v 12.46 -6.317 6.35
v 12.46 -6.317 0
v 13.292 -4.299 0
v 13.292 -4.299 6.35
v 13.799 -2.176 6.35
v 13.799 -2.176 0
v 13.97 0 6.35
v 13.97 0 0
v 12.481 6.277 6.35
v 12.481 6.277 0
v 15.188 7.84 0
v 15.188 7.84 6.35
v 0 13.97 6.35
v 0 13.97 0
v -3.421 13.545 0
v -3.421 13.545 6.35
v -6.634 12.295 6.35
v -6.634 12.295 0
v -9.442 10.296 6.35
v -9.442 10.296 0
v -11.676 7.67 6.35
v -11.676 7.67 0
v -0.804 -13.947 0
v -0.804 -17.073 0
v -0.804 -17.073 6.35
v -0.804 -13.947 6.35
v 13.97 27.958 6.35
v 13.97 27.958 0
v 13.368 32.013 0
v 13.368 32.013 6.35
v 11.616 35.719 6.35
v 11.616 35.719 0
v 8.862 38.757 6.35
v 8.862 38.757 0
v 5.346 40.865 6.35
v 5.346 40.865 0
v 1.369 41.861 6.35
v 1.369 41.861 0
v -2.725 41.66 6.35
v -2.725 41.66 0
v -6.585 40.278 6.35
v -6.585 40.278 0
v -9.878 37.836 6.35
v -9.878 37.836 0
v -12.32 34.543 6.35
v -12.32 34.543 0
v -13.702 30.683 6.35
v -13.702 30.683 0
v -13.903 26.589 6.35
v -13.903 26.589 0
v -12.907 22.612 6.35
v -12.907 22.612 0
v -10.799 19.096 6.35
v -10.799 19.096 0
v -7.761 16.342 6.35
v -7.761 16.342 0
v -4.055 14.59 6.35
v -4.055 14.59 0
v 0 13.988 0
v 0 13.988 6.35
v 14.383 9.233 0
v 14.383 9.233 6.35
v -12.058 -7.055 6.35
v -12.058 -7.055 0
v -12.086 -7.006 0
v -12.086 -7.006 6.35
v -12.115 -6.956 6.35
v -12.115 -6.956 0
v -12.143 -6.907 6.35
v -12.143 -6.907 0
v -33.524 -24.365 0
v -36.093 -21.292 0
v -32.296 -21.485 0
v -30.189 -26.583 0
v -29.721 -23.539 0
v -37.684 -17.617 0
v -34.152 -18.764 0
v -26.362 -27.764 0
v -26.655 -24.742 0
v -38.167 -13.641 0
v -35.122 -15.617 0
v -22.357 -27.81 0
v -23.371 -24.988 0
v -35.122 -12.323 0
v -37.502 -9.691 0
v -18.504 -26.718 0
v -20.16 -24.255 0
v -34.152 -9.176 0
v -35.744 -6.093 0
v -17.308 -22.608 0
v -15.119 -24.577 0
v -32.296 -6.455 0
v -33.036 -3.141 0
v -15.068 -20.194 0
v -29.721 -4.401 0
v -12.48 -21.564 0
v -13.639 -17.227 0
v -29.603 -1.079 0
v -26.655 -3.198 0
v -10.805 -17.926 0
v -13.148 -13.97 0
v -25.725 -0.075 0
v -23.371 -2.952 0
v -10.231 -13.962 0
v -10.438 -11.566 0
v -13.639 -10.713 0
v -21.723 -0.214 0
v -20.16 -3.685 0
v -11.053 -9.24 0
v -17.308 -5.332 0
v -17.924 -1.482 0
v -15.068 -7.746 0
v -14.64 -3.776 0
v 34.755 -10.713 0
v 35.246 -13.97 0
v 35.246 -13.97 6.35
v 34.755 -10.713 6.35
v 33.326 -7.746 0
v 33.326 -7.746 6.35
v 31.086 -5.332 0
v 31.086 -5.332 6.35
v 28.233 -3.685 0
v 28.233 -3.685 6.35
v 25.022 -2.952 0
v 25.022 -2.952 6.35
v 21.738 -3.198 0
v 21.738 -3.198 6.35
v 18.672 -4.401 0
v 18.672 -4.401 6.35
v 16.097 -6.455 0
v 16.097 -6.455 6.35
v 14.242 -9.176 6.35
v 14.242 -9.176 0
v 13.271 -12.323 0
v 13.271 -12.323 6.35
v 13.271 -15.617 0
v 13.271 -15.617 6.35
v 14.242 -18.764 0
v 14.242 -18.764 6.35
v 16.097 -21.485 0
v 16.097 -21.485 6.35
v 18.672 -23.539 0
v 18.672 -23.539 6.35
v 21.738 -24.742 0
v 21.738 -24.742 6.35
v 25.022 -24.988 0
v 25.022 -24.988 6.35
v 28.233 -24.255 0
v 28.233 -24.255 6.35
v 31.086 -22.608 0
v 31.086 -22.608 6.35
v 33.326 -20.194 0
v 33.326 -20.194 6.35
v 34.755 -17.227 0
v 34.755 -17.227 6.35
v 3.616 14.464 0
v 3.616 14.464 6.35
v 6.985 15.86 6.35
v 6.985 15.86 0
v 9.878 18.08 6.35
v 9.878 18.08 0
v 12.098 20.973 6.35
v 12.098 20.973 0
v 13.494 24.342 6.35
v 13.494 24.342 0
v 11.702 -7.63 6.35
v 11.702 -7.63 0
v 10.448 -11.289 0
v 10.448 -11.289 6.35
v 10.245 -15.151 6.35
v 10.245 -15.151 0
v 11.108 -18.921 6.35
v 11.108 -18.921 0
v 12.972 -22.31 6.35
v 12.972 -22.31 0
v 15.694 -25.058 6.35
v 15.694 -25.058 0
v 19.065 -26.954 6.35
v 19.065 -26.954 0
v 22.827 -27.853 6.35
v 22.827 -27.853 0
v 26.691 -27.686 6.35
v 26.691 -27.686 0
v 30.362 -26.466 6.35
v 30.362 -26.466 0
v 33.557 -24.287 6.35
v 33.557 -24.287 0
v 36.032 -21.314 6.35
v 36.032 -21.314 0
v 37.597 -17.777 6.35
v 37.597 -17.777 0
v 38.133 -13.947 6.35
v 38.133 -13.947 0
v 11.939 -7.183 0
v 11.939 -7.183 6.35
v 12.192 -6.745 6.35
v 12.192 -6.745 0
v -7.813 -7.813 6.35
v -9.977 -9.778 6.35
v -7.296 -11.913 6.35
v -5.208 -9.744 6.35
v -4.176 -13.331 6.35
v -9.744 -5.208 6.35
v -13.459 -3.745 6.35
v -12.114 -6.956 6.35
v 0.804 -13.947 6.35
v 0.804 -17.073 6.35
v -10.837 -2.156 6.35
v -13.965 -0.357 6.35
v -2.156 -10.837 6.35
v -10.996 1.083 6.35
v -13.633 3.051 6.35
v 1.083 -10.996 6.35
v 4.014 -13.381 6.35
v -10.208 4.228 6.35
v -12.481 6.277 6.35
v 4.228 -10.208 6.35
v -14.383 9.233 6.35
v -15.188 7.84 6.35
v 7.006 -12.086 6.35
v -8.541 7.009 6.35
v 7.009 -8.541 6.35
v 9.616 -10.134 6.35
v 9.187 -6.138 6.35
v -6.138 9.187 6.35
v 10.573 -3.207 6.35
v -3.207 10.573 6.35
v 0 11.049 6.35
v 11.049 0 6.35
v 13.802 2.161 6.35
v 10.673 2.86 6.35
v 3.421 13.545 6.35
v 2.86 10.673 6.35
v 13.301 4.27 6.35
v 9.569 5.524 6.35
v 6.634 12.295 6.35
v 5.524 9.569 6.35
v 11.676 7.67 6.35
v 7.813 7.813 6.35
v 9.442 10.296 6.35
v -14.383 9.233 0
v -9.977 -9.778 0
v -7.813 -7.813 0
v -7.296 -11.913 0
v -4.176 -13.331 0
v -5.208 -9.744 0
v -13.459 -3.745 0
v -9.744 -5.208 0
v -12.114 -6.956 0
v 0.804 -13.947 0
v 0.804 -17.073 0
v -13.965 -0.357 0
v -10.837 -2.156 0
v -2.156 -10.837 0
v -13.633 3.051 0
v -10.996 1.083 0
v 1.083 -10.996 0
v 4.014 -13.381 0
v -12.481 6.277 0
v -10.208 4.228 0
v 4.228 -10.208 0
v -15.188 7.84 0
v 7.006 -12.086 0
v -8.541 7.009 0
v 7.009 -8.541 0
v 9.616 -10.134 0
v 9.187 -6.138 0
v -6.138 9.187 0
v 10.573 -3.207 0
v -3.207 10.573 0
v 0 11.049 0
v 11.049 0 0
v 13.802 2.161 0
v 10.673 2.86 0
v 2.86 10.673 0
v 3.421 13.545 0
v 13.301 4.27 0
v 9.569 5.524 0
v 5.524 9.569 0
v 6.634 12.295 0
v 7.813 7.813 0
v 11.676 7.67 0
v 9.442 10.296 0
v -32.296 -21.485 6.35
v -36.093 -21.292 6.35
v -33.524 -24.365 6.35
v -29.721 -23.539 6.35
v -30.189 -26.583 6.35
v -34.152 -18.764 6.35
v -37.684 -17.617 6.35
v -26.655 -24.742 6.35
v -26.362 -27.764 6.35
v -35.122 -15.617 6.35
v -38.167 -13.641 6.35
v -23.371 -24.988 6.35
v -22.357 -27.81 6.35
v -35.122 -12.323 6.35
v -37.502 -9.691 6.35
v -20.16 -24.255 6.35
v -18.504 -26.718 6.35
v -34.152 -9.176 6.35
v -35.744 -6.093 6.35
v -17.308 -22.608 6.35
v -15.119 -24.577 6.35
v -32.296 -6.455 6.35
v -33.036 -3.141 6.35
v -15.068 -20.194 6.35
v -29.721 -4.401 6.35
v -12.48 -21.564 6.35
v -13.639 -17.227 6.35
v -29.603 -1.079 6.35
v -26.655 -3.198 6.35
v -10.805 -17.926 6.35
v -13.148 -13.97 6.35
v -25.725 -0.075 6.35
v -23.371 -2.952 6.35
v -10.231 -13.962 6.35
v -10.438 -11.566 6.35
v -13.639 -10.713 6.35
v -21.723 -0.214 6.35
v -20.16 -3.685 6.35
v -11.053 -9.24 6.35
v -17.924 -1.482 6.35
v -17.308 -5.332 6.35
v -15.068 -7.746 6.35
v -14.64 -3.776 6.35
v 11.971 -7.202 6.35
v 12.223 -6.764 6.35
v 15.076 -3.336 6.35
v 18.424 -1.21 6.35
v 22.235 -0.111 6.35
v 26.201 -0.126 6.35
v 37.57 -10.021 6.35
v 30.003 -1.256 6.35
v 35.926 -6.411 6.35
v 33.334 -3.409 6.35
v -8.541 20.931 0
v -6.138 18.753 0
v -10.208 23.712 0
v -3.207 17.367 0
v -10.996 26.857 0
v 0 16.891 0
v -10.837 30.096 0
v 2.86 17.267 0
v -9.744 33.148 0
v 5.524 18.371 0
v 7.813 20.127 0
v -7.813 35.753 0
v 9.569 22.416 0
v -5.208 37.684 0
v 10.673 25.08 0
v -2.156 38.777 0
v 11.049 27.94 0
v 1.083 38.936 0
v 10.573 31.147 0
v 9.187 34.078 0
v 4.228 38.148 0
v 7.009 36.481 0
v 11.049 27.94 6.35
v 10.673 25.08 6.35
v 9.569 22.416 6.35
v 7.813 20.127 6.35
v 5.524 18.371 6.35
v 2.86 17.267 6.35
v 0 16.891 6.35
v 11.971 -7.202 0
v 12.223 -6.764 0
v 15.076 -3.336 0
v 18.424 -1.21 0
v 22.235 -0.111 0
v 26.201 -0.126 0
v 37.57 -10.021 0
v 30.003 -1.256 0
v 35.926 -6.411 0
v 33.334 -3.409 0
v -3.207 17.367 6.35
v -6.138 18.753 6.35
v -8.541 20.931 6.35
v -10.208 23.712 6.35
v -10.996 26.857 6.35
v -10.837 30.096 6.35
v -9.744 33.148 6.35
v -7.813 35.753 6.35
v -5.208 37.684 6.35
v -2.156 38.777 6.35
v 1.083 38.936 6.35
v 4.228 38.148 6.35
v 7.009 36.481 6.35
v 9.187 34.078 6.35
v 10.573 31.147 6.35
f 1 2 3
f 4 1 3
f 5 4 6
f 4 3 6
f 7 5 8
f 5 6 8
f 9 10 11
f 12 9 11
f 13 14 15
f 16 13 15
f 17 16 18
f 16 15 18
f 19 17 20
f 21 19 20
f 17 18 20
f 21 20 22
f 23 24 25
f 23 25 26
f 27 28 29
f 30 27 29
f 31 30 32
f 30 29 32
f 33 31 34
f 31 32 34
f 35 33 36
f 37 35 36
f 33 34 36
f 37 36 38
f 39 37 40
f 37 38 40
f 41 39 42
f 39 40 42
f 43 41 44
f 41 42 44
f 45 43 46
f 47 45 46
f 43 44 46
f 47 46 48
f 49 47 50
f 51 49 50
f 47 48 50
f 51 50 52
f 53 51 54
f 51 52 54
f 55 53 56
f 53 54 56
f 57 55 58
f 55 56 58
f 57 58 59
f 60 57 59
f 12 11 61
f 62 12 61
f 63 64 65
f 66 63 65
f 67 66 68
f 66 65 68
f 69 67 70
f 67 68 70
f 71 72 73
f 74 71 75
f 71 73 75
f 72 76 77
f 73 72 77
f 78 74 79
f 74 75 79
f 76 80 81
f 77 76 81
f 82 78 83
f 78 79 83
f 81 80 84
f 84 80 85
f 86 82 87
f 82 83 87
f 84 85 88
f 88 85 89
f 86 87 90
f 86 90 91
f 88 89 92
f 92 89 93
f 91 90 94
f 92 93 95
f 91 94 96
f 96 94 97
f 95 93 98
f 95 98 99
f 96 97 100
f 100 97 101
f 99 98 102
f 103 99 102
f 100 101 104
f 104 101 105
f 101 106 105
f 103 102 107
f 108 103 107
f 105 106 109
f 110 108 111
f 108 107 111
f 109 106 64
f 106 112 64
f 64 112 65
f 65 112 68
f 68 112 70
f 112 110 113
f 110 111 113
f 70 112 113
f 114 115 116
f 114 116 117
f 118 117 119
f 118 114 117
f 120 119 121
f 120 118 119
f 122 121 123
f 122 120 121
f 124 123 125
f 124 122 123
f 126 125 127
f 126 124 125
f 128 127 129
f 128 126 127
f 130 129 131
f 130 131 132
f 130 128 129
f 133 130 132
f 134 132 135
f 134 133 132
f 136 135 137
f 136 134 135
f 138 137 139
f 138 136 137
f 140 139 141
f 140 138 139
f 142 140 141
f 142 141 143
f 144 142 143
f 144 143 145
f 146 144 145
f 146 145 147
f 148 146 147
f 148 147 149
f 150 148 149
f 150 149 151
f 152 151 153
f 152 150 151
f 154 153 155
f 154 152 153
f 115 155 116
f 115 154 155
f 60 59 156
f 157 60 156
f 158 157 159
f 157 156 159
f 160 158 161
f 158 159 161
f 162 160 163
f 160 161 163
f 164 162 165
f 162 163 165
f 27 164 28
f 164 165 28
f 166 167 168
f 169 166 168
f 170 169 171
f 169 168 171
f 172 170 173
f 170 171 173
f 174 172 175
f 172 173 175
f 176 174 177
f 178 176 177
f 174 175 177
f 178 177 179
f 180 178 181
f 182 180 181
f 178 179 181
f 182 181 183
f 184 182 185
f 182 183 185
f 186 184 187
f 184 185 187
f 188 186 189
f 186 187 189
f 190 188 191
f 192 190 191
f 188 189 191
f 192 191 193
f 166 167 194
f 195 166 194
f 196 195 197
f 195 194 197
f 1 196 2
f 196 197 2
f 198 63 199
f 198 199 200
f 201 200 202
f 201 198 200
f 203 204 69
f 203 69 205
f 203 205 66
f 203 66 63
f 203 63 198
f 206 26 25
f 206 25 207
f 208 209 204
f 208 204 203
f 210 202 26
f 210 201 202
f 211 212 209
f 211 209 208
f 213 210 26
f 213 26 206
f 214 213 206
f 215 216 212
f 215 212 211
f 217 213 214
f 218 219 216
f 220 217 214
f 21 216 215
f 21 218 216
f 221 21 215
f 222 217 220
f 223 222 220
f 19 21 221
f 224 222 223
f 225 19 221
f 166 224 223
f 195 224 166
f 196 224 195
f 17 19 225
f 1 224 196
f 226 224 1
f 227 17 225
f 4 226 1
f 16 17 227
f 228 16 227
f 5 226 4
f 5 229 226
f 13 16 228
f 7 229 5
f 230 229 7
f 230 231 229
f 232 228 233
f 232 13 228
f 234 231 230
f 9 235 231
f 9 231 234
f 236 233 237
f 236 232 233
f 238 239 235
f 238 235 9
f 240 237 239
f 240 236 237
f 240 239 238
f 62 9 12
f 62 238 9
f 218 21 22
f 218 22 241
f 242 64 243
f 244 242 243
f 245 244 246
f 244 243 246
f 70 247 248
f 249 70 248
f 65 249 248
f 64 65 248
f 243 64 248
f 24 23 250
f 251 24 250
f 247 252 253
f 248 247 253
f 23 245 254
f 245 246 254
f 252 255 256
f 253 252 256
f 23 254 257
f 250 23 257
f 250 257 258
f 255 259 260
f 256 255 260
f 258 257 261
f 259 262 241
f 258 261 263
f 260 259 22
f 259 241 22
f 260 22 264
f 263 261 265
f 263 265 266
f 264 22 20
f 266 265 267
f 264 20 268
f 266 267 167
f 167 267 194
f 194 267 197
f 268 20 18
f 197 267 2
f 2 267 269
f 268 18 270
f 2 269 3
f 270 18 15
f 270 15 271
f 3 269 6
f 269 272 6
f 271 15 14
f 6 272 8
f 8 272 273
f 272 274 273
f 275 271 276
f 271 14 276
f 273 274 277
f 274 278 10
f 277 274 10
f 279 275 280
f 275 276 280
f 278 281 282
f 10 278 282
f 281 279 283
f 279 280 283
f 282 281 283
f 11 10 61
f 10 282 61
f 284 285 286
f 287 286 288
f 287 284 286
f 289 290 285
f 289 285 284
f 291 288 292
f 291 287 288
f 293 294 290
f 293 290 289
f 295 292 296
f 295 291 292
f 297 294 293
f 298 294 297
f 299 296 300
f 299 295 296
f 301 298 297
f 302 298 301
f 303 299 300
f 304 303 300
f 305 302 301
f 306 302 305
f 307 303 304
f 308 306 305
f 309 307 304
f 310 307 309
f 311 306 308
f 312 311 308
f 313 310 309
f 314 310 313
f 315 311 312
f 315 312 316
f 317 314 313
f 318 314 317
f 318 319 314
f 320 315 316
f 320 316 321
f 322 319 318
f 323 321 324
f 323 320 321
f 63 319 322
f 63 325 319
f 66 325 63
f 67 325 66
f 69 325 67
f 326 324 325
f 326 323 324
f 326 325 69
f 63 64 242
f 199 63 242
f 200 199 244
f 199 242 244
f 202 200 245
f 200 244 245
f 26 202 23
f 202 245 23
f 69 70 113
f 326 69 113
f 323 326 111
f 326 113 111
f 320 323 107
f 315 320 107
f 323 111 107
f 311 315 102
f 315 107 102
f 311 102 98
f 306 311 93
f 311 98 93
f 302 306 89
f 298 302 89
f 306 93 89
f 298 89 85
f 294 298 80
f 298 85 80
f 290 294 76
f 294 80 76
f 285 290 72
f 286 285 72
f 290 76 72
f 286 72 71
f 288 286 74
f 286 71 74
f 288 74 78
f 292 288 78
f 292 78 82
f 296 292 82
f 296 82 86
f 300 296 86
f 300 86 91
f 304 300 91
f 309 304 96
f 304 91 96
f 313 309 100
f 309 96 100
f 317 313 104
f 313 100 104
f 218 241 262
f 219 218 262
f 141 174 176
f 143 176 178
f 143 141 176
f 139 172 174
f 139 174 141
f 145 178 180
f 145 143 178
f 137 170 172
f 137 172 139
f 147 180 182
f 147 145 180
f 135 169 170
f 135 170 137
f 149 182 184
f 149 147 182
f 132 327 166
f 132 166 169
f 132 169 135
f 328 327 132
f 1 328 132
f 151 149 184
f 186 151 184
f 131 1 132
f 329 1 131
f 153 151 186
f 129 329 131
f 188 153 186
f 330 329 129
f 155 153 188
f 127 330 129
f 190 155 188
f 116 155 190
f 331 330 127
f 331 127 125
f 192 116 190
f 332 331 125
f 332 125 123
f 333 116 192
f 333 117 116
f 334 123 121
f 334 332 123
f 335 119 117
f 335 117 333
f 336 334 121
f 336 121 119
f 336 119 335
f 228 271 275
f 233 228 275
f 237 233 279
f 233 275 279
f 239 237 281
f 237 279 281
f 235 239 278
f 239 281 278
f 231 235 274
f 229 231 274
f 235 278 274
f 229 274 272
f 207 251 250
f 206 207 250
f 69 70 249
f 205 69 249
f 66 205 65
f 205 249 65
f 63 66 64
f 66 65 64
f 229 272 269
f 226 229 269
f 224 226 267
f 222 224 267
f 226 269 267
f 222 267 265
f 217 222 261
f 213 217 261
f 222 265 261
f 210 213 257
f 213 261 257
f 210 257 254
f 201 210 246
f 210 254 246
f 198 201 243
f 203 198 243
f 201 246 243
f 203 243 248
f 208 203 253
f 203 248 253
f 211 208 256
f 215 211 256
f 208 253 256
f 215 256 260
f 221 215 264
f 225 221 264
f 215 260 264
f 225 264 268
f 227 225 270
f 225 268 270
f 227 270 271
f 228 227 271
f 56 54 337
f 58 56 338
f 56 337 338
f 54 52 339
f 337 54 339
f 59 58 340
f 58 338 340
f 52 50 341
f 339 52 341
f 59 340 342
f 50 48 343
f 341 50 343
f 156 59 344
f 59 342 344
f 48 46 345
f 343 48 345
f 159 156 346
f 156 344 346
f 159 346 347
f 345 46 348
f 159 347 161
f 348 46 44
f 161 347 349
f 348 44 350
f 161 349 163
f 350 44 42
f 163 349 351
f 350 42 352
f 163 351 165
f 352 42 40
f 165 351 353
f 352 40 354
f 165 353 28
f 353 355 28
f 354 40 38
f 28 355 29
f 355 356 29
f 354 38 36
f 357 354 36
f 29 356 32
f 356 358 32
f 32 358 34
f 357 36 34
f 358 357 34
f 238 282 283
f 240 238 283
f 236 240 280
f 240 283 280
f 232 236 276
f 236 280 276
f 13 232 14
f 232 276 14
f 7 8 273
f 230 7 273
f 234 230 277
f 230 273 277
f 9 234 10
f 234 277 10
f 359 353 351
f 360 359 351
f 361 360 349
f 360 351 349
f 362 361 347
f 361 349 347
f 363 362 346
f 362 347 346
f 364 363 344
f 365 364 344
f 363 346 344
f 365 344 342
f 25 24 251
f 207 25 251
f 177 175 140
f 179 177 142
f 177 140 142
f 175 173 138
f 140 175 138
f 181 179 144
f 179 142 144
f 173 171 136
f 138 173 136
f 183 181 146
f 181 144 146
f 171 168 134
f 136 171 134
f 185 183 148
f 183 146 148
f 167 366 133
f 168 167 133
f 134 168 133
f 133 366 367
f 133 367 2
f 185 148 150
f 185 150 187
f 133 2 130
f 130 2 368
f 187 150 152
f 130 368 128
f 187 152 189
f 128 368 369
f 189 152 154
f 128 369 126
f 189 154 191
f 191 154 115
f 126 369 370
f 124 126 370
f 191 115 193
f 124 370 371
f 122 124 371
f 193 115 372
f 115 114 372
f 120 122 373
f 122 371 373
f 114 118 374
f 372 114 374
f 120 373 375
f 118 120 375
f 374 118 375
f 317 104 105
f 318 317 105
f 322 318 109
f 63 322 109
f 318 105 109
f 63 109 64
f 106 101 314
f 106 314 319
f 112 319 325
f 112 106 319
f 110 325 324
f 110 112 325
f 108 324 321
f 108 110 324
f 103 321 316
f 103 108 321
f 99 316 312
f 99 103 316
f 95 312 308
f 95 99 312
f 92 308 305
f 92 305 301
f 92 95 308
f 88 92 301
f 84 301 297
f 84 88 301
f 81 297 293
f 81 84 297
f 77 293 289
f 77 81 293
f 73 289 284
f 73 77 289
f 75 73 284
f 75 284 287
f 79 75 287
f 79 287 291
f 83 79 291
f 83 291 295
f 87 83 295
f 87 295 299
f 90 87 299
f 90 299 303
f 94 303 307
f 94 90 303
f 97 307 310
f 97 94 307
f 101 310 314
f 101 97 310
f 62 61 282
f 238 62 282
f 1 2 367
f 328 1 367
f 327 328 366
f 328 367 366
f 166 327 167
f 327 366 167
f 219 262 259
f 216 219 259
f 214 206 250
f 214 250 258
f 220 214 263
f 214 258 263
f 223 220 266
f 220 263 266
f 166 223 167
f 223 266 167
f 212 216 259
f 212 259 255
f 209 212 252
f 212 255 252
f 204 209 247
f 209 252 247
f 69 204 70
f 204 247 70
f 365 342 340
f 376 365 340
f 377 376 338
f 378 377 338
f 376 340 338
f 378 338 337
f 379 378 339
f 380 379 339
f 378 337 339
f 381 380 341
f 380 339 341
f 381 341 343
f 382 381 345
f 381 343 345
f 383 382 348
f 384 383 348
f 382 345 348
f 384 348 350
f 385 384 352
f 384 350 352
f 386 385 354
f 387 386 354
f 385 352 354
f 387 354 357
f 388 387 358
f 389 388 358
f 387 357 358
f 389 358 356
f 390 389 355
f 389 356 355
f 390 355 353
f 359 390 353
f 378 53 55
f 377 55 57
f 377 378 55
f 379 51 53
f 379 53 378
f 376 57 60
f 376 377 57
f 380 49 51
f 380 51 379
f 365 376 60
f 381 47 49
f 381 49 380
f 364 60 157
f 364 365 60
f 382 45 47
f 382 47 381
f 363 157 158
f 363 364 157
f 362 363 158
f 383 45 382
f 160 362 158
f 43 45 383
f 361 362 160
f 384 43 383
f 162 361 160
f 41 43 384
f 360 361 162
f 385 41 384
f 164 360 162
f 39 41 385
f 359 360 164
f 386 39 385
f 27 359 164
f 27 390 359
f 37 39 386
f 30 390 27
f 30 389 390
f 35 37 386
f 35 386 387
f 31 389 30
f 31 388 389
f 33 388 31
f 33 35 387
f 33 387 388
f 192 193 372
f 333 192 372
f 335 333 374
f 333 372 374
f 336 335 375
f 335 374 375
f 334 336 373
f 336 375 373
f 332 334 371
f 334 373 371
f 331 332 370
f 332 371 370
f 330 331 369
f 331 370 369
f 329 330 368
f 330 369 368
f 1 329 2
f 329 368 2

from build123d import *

# Parameters (mm, degrees)
F2_DEPTH = 6.35
F1_R     = 11.049
F6_W     = 1.6089215642
F6_H     = 3.1721480191
F7_DEPTH = 6.35


# Not quite as in the source:
# - the program builds the solid bodies; features that only make, move or delete a surface that nothing else refers to are left out


with BuildPart() as f2:
    # F1 (on face) → F2 (new body)
    with BuildSketch(Plane.XY):
        with BuildLine():
            ThreePointArc((0, 13.9879982162), (9.8782817332, 18.079716483), (13.97, 27.9579982162))
            ThreePointArc((13.97, 27.9579982162), (-9.8782817332, 37.8362799493), (0, 13.9879982162))
        make_face()
        with BuildLine():
            ThreePointArc((11.049, 27.94), (7.8128228253, 20.1271771747), (0, 16.891))
            ThreePointArc((0, 16.891), (-7.8128228253, 35.7528228253), (11.049, 27.94))
        make_face(mode=Mode.SUBTRACT)
    extrude(amount=F2_DEPTH)


with BuildPart() as f2b:
    # F1 (on face) → F2, piece 2 (new body)
    with BuildSketch(Plane.XY):
        with BuildLine():
            ThreePointArc((13.97, 0), (9.8782817332, 9.8782817332), (0, 13.97))
            ThreePointArc((0, 13.97), (-12.0758386026, 7.0238893815), (-12.1430715152, -6.9070047181))
            ThreePointArc((-12.1430715152, -6.9070047181), (-12.1001592972, -6.9808632821), (-12.0576994887, -7.0549828518))
            ThreePointArc((-12.0576994887, -7.0549828518), (-0.3379497641, -13.9659117123), (11.7023511261, -7.6299330352))
            ThreePointArc((11.7023511261, -7.6299330352), (12.063452241, -6.9631738679), (12.4601983994, -6.3169894607))
            ThreePointArc((12.4601983994, -6.3169894607), (13.5873078945, -3.2474550313), (13.97, 0))
        make_face()
        with BuildLine():
            ThreePointArc((11.049, 0), (-7.8128228253, -7.8128228253), (0, 11.049))
            ThreePointArc((0, 11.049), (7.8128228253, 7.8128228253), (11.049, 0))
        make_face(mode=Mode.SUBTRACT)
    extrude(amount=F2_DEPTH)

    # F6 (on Top) → F7 (join)
    with BuildSketch(Plane.XY):
        with Locations((0, -15.4868941754)):
            Rectangle(F6_W, F6_H)
        Polygon((14.3833937751, 9.2331675661), (11.636233006, 7.6470935566), (12.4406937881, 6.2537266093), (15.1878545572, 7.8398006188), align=None)
        Polygon((-15.1878545572, 7.8398006188), (-12.4406937881, 6.2537266093), (-11.636233006, 7.6470935566), (-14.3833937751, 9.2331675661), align=None)
    extrude(amount=F7_DEPTH)


with BuildPart() as f2c:
    # F1 (on face) → F2, piece 3 (new body)
    with BuildSketch(Plane.XY):
        with BuildLine():
            ThreePointArc((-12.0576994887, -7.0549828518), (-12.1006117068, -6.9811242878), (-12.1430715152, -6.9070047181))
            ThreePointArc((-12.1430715152, -6.9070047181), (-37.6842231186, -17.616767874), (-10.230771004, -13.9619875699))
            ThreePointArc((-10.230771004, -13.9619875699), (-10.6952238276, -10.3897200175), (-12.0576994887, -7.0549828518))
        make_face()
        with Locations((-24.1967497817, -13.97)):
            Circle(F1_R, mode=Mode.SUBTRACT)
    extrude(amount=F2_DEPTH)


with BuildPart() as f2d:
    # F1 (on face) → F2, piece 4 (new body)
    with BuildSketch(Plane.XY):
        with BuildLine():
            ThreePointArc((38.1325495255, -13.946922496), (28.1424398989, -0.5558294631), (12.4601983994, -6.3169894607))
            ThreePointArc((12.4601983994, -6.3169894607), (12.0990972845, -6.983748628), (11.7023511261, -7.6299330352))
            ThreePointArc((11.7023511261, -7.6299330352), (20.9150944942, -27.5342303905), (38.1325495255, -13.946922496))
        make_face()
        with Locations((24.1967497817, -13.97)):
            Circle(F1_R, mode=Mode.SUBTRACT)
    extrude(amount=F2_DEPTH)


solid = Compound([f2.part, f2b.part, f2c.part, f2d.part])
